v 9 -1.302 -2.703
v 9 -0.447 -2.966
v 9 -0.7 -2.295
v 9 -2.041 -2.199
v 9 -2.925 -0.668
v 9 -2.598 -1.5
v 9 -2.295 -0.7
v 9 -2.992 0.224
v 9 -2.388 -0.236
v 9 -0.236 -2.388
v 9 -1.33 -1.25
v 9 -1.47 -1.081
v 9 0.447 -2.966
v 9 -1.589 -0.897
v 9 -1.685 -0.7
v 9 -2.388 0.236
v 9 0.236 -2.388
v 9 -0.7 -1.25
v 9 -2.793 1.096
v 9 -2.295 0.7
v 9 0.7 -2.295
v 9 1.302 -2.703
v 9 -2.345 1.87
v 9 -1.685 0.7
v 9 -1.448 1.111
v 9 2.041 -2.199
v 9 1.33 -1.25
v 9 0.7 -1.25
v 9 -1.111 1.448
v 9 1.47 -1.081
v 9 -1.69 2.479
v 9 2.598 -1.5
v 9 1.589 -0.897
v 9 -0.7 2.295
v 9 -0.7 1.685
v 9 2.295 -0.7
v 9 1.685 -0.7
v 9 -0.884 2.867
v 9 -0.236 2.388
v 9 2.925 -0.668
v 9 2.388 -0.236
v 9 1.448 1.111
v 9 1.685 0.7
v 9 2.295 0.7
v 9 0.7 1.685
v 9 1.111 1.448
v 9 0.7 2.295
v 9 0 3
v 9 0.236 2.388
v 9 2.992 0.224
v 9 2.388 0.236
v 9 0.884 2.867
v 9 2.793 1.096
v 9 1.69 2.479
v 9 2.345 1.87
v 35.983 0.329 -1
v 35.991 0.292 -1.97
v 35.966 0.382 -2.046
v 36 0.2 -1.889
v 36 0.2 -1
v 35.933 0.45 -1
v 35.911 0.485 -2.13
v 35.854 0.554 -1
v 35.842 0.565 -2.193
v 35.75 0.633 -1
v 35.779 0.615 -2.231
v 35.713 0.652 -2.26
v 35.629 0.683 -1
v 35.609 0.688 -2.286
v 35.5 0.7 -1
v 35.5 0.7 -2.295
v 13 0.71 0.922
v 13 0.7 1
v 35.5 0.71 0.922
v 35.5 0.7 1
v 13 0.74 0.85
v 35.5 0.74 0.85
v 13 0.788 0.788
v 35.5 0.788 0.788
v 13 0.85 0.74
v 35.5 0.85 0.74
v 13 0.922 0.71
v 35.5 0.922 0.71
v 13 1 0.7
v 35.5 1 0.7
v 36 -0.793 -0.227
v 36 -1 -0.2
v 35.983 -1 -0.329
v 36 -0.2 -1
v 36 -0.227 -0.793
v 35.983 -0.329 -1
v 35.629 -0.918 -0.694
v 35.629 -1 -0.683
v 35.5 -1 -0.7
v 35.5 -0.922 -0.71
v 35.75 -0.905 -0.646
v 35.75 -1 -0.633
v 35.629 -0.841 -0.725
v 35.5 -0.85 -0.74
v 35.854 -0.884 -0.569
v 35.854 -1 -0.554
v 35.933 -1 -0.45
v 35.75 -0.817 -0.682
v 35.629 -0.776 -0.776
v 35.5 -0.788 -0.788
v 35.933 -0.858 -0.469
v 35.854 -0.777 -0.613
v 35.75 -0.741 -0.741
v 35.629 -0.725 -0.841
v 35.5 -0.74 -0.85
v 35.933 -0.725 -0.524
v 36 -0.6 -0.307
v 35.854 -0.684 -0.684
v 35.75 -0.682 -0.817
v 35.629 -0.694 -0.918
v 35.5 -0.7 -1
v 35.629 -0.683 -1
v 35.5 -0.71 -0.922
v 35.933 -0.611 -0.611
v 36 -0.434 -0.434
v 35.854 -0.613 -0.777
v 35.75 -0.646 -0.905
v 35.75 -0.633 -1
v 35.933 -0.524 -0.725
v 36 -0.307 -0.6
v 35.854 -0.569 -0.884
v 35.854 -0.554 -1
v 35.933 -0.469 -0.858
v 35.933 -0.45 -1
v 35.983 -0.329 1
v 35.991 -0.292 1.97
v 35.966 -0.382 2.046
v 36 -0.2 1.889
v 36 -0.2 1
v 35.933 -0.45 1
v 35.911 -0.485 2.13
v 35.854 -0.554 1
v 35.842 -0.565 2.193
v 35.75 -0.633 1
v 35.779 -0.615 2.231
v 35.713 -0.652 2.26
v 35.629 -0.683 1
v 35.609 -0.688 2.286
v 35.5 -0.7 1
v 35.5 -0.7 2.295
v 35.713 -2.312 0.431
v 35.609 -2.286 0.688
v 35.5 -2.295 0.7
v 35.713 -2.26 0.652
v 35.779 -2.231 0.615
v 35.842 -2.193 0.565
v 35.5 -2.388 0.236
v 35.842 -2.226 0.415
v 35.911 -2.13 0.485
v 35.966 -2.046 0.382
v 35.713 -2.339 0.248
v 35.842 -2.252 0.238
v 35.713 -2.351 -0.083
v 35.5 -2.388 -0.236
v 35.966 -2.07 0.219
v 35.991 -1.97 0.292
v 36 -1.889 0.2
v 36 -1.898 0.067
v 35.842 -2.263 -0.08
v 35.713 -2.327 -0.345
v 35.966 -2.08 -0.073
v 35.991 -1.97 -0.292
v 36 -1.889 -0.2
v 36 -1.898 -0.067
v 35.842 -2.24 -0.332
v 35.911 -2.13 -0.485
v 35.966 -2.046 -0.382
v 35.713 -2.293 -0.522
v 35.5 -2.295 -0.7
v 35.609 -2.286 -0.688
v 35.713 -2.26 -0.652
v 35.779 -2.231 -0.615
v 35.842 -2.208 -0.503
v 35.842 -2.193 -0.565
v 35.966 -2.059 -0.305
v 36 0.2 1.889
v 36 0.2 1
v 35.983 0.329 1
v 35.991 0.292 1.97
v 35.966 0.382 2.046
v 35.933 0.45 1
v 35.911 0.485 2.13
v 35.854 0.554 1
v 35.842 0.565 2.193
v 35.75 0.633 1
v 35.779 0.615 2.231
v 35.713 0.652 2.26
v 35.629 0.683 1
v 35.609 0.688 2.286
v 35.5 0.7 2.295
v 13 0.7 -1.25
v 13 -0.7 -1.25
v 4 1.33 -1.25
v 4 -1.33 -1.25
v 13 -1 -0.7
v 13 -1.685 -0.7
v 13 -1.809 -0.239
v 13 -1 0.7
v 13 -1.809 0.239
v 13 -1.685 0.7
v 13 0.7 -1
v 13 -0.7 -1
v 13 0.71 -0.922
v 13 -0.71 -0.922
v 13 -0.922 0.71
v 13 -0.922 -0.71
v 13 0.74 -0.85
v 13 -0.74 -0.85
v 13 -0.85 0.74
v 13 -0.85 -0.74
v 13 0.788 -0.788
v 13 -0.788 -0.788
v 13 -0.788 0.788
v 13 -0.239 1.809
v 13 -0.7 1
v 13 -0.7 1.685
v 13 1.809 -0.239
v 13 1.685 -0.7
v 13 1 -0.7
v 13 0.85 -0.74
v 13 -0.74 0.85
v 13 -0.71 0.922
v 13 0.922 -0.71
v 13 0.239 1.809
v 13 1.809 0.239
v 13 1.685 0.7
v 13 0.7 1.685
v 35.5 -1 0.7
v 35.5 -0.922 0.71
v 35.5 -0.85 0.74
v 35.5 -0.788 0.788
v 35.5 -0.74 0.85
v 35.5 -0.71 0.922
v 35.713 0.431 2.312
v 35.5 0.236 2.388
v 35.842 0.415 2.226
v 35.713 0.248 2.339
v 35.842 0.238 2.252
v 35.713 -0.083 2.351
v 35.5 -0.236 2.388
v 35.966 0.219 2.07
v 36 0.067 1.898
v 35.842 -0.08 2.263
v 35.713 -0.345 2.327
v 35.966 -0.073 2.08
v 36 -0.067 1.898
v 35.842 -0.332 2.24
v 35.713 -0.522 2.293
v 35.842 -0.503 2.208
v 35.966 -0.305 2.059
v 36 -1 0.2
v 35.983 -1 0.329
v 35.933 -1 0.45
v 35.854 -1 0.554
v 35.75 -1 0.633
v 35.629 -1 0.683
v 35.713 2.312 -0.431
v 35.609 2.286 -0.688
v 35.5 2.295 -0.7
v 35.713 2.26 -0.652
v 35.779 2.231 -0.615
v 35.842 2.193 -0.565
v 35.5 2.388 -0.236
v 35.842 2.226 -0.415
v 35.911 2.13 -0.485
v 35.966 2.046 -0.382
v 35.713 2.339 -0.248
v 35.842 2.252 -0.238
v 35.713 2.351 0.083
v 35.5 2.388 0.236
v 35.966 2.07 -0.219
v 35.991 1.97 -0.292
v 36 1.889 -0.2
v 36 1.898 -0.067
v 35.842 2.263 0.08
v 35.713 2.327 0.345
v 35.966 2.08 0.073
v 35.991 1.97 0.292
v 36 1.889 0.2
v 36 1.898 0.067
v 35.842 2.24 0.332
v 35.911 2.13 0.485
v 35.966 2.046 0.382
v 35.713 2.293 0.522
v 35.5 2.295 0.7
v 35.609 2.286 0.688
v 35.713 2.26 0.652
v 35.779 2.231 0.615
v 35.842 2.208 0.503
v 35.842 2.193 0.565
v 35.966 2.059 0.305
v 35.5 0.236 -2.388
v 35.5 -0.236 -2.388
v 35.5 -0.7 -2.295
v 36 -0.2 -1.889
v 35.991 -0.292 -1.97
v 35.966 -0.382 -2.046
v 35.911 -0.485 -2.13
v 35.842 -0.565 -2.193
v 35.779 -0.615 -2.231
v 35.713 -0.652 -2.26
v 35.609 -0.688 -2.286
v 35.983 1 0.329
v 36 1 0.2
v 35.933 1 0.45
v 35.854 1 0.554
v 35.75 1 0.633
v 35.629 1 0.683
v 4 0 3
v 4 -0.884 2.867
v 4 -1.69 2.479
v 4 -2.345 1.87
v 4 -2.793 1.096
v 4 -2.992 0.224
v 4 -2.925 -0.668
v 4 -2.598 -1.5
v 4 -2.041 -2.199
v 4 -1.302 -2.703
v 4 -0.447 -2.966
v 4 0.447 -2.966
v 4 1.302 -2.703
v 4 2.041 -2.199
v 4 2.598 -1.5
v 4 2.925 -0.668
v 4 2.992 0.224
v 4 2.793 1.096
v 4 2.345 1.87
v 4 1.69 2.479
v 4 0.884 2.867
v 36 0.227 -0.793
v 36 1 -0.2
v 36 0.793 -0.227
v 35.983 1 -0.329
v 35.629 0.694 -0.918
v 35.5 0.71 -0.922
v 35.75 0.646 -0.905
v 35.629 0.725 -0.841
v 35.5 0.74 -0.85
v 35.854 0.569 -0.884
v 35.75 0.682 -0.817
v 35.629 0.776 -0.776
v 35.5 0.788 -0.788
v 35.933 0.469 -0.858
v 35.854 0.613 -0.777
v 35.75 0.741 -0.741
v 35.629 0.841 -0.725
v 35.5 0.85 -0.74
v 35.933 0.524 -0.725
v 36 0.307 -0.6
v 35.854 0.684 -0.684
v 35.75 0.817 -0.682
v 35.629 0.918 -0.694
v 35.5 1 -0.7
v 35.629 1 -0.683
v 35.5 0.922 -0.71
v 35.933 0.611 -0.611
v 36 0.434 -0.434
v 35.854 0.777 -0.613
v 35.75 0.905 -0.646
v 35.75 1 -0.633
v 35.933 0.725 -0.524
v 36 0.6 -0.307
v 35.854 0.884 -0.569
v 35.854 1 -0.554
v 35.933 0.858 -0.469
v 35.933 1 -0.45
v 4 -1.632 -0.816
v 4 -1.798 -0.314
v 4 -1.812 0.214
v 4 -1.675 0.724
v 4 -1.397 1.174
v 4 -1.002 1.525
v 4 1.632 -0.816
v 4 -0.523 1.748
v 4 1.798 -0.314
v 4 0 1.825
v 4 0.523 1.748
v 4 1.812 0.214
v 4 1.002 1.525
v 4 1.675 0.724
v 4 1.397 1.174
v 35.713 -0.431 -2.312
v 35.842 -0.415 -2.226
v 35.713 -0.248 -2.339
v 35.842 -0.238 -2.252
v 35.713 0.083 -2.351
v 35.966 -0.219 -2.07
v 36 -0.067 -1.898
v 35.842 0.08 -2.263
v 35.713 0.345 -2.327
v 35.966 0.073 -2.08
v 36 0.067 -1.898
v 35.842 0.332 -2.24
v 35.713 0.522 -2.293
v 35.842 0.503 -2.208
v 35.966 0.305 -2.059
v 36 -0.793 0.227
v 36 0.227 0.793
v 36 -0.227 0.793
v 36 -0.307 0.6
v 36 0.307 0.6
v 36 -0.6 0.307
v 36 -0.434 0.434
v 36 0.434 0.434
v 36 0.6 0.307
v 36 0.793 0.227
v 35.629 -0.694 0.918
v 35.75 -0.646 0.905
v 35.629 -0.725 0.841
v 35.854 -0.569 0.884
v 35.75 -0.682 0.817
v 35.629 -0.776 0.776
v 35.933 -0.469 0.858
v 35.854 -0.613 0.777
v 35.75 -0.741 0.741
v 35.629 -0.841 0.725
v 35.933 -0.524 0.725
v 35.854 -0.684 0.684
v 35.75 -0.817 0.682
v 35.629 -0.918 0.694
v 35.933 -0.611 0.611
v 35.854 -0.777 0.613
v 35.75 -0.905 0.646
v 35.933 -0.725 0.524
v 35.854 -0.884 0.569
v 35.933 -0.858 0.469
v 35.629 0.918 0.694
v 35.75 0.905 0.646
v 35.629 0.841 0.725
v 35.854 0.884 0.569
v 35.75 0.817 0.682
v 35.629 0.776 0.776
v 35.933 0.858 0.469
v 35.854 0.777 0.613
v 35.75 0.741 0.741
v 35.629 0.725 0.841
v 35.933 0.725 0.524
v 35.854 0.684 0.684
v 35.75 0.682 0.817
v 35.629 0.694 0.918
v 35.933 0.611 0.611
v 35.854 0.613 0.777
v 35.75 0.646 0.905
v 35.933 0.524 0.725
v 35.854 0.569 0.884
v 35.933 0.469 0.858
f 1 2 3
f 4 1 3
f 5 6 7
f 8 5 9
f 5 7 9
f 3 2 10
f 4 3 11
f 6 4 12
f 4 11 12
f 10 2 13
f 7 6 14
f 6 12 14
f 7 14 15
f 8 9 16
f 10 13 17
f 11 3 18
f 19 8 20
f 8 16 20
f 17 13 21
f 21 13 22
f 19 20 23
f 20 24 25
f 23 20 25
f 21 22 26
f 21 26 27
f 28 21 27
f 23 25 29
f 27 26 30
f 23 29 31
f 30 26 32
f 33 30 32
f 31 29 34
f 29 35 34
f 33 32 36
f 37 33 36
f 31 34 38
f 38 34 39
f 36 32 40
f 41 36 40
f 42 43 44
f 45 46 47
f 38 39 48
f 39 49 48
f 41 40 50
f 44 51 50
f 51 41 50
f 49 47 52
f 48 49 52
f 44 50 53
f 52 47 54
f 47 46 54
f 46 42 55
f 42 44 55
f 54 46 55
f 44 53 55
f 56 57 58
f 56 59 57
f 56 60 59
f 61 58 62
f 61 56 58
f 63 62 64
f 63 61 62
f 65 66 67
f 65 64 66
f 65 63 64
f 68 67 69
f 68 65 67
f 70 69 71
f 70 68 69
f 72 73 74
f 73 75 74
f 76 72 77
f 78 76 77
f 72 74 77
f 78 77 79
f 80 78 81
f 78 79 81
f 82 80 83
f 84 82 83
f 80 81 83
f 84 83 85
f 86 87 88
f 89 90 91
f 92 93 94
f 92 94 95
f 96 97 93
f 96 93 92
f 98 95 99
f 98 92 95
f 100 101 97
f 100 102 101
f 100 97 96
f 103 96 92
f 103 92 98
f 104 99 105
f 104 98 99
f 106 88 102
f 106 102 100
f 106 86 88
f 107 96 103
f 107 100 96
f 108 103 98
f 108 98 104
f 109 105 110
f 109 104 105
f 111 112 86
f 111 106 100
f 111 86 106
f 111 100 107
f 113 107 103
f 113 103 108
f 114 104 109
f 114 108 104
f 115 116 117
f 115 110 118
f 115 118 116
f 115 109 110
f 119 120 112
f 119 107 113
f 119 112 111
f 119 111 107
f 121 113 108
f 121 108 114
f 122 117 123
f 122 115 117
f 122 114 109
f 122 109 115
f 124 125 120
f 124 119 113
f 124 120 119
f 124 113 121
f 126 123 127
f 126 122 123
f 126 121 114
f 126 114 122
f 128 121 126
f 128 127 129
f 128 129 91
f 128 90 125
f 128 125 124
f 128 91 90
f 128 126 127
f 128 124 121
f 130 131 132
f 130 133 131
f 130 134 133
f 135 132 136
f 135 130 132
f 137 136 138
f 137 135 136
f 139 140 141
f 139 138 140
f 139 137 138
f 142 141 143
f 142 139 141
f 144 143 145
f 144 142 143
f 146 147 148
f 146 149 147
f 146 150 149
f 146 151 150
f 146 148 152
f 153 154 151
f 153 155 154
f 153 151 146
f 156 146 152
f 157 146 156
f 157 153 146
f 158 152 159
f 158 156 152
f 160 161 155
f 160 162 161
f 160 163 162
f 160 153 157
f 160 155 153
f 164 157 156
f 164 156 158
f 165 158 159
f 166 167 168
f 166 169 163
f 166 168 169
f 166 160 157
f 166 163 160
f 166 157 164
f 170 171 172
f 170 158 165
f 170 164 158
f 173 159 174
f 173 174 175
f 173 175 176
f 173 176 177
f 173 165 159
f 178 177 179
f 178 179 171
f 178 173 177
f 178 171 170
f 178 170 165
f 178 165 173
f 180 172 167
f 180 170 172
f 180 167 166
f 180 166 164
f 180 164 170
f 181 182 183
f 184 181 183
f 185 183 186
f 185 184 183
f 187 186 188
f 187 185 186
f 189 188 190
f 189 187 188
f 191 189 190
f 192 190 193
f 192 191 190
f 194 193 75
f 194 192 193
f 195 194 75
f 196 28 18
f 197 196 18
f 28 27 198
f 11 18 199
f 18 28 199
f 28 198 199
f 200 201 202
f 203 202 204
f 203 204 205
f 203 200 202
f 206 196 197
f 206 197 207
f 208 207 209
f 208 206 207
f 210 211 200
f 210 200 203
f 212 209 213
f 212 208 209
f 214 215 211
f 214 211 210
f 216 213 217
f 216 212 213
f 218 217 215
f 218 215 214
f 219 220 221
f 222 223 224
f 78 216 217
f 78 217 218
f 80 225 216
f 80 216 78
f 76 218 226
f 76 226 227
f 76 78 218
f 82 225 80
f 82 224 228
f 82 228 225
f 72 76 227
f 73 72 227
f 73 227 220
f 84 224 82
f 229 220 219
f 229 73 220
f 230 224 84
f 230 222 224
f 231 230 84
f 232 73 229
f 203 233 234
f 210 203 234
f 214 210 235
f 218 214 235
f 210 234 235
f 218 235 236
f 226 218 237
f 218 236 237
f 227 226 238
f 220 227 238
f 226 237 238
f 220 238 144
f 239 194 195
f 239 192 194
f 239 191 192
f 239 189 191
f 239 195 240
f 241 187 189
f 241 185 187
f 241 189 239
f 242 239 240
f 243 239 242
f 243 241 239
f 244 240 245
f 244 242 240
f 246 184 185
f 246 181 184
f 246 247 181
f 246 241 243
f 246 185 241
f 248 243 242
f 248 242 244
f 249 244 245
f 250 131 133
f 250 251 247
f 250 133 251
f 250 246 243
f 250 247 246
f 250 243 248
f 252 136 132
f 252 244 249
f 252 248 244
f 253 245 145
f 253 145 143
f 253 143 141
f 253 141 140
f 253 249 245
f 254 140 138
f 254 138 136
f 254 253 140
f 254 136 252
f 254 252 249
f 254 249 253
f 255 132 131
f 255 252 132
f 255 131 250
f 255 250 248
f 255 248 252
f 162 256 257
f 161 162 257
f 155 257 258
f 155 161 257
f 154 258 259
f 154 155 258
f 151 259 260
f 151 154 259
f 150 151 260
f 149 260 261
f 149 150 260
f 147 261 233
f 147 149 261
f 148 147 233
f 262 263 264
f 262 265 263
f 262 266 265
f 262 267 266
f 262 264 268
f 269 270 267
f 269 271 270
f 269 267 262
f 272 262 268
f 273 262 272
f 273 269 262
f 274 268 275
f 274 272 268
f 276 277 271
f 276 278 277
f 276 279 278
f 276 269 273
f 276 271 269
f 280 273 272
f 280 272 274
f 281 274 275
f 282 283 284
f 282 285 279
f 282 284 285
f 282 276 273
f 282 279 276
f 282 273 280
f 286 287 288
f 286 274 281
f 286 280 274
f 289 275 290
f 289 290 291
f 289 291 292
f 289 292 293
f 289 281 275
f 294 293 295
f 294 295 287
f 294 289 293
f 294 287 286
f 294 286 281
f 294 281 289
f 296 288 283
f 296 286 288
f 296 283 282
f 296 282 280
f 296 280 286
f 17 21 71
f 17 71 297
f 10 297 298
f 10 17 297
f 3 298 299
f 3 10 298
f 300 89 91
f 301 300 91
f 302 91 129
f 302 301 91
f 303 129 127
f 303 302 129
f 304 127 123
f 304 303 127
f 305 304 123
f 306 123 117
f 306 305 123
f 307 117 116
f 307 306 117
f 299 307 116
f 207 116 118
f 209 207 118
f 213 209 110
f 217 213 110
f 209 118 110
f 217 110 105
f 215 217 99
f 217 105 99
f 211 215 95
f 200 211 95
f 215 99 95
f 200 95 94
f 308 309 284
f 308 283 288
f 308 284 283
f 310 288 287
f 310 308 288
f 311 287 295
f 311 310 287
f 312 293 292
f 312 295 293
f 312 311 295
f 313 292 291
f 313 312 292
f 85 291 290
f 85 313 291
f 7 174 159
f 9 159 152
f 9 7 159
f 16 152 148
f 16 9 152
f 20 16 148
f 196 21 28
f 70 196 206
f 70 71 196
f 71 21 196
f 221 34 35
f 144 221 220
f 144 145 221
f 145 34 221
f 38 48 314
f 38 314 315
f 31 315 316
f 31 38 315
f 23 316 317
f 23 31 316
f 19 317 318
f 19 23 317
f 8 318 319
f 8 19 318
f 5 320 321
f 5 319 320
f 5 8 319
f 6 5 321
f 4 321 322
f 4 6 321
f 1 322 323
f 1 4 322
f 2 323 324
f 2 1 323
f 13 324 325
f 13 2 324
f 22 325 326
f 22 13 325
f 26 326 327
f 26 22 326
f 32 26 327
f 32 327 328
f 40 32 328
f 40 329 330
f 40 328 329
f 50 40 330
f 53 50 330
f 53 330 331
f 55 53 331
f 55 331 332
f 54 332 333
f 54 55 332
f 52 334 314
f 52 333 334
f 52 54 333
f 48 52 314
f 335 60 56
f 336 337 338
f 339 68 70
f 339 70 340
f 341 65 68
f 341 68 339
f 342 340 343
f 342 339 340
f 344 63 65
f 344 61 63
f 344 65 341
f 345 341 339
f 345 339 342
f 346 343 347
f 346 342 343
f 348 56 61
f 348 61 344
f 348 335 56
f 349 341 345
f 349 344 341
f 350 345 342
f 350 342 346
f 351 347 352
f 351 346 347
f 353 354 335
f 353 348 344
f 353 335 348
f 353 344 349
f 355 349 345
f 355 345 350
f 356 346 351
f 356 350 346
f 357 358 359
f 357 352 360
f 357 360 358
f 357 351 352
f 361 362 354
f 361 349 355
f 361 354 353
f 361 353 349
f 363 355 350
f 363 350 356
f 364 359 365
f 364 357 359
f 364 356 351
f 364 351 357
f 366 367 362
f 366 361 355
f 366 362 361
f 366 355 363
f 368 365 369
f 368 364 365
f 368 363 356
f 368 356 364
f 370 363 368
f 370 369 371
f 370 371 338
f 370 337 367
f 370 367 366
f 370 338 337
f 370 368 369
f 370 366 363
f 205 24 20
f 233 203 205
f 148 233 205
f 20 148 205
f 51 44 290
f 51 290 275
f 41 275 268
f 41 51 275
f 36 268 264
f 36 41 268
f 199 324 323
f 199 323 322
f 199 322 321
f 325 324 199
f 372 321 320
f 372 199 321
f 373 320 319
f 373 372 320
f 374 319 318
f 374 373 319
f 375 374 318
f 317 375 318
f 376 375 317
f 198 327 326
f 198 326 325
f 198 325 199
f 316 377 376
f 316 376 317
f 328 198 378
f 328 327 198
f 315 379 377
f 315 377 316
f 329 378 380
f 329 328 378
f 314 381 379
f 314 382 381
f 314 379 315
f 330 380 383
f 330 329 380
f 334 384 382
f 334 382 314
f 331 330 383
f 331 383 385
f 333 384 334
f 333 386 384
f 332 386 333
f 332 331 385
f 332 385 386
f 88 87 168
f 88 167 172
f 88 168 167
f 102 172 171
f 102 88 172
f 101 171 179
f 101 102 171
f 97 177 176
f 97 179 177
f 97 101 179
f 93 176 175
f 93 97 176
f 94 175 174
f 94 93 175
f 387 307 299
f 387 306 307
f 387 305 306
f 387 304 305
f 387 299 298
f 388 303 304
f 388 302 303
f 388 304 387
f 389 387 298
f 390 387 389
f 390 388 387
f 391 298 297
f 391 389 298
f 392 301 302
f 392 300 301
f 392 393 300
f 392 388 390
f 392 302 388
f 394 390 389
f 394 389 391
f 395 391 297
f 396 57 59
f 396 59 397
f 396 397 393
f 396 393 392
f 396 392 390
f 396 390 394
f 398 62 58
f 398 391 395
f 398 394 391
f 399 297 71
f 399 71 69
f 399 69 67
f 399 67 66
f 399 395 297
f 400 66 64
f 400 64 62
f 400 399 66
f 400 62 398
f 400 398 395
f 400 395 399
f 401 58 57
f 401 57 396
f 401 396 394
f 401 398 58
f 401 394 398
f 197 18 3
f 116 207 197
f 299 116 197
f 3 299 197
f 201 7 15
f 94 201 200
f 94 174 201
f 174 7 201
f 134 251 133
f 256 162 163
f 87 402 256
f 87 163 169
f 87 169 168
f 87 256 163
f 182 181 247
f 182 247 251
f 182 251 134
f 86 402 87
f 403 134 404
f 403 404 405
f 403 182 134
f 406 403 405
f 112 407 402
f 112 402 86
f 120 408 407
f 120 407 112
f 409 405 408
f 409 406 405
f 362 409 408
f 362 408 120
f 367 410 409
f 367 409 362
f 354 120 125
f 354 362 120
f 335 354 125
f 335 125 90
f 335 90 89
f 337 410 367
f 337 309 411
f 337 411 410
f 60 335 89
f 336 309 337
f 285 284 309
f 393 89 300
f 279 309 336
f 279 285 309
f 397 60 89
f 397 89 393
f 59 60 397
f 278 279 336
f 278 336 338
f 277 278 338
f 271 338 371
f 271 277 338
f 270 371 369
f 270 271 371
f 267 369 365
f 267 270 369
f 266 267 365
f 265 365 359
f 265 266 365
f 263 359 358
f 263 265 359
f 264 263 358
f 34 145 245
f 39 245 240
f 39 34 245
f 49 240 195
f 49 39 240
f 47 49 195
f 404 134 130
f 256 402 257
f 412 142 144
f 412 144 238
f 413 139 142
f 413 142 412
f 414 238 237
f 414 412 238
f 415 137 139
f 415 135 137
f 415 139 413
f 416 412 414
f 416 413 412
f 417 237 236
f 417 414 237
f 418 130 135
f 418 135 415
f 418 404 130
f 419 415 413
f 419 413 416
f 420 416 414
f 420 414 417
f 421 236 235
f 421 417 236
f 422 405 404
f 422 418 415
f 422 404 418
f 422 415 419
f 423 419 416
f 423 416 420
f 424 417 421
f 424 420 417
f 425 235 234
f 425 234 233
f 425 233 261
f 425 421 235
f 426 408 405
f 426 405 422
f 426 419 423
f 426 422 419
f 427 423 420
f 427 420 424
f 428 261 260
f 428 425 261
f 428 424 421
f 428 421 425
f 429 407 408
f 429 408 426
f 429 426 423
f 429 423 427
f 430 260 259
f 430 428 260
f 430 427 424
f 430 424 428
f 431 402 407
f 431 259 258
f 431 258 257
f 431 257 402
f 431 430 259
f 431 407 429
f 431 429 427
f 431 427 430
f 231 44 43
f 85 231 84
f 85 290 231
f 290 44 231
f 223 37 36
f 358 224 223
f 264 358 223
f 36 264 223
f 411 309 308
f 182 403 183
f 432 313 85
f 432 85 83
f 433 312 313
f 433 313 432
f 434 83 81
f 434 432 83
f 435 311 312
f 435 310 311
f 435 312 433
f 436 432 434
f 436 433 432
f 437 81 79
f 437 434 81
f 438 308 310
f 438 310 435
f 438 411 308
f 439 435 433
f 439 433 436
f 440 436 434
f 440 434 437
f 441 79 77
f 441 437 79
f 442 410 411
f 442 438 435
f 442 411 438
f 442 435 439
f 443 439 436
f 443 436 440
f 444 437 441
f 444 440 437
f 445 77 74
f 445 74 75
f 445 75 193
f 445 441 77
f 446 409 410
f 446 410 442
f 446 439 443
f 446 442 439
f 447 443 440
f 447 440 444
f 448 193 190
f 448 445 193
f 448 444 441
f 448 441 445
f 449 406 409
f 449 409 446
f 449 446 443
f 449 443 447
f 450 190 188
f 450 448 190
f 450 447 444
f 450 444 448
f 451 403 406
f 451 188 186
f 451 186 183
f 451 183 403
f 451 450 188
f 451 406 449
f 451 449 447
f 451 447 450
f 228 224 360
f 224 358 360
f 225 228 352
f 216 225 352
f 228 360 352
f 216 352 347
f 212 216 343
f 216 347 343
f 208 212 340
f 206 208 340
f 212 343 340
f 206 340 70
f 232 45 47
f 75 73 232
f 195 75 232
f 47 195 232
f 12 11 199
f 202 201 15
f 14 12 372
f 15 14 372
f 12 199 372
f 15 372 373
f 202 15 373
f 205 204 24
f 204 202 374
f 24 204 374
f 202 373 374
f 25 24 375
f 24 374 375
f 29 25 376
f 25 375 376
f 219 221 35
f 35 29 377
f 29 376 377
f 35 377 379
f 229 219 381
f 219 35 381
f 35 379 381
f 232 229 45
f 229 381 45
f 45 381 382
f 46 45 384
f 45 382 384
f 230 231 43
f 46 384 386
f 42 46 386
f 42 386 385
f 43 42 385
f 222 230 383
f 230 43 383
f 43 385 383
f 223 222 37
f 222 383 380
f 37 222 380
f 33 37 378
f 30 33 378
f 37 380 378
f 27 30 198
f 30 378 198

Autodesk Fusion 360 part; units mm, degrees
sketch "Sketch1" plane through (0, 0, 0) normal (1, 0, 0) x (0, 0, -1)
  circle A0 centre (0, 0) radius 2.3995
  dimension "d1" = 4.799
extrude "Extrude1" add sketch "Sketch1" along normal blind 36
sketch "Sketch2" plane through (36, 0, 0) normal (1, 0, 0) x (0, 0, -1)
  circle A0 centre (0, 0) radius 2.3995
  line L0 (0.7, 2.3995) -> (-0.7, 2.3995)
  line L1 (-0.7, -2.3995) -> (0.7, -2.3995)
  line L2 (0.7, 2.3995) -> (-0.7, -2.3995) construction
  line L3 (-0.7, 2.3995) -> (0.7, -2.3995) construction
  line L4 (-2.3995, 0.7) -> (-2.3995, -0.7)
  line L5 (2.3995, -0.7) -> (2.3995, 0.7)
  line L6 (2.3995, 0.7) -> (-2.3995, -0.7) construction
  line L7 (-2.3995, 0.7) -> (2.3995, -0.7) construction
  line L8 (-0.7, 2.3995) -> (-0.7, 1)
  line L9 (-0.7, -1) -> (-0.7, -2.3995)
  line L10 (-2.3995, -0.7) -> (-1, -0.7)
  line L11 (1, -0.7) -> (2.3995, -0.7)
  line L12 (0.7, -2.3995) -> (0.7, -1)
  line L13 (0.7, 1) -> (0.7, 2.3995)
  line L14 (2.3995, 0.7) -> (1, 0.7)
  line L15 (-1, 0.7) -> (-2.3995, 0.7)
  arc A1 (-1, 0.7) -> (-0.7, 1) centre (-1, 1) ccw
  arc A2 (0.7, 1) -> (1, 0.7) centre (1, 1) ccw
  arc A3 (1, -0.7) -> (0.7, -1) centre (1, -1) ccw
  arc A4 (-0.7, -1) -> (-1, -0.7) centre (-1, -1) ccw
  dimension "d4" = 4.799
  dimension "d5" = 1.4
  dimension "d6" = 4.799
  dimension "d7" = 1.4
  dimension "d8" = 0.3
  dimension "d11" = 0.3
extrude "Extrude2" cut sketch "Sketch2" against normal blind 27 contours A0 L13 L14 A2 | A0 L11 L12 A3 | A0 L8 L15 A1 | A0 L9 L10 A4
sketch "Sketch4" plane through (0, 0, 0) normal (-1, 0, 0) x (0, 0, 1)
  circle A0 centre (0, 0) radius 2.3995
  circle A1 centre (0, 0) radius 2.3995
  arc A2 (2.2951, 0.7) -> (0.7, 2.2951) centre (0, 0) ccw
extrude "Extrude4" cut sketch "Sketch4" against normal blind 9
sketch "Sketch5" plane through (9, 0, 0) normal (-1, 0, 0) x (0, 0, 1)
  line L0 (-2.2951, -0.7) -> (-1, -0.7)
  arc A0 (-0.7, -1) -> (-1, -0.7) centre (-1, -1) ccw
  line L1 (-0.7, -1) -> (-0.7, -2.2951)
  arc A1 (-0.7, -2.2951) -> (0.7, -2.2951) centre (0, 0) ccw
  line L2 (0.7, -2.2951) -> (0.7, -1)
  arc A2 (1, -0.7) -> (0.7, -1) centre (1, -1) ccw
  line L3 (1, -0.7) -> (2.2951, -0.7)
  arc A3 (2.2951, -0.7) -> (2.2951, 0.7) centre (0, 0) ccw
  line L4 (2.2951, 0.7) -> (1, 0.7)
  arc A4 (0.7, 1) -> (1, 0.7) centre (1, 1) ccw
  line L5 (0.7, 1) -> (0.7, 2.2951)
  arc A5 (0.7, 2.2951) -> (-0.7, 2.2951) centre (0, 0) ccw
  line L6 (-0.7, 2.2951) -> (-0.7, 1)
  arc A6 (-1, 0.7) -> (-0.7, 1) centre (-1, 1) ccw
  line L7 (-1, 0.7) -> (-2.2951, 0.7)
  arc A7 (-2.2951, 0.7) -> (-2.2951, -0.7) centre (0, 0) ccw
  circle A8 centre (0, 0) radius 3
  dimension "d19" = 6
extrude "Extrude5" add sketch "Sketch5" along normal blind 5 contours L0 A0 L1 A1 L2 A2 L3 A3 L4 A4 L5 A5 L6 A6 L7 A7 | A8
sketch "Sketch6" plane through (4, 0, 0) normal (-1, 0, 0) x (0, 0, 1)
  circle A0 centre (0, 0) radius 3
  line L0 (-1.25, 0) -> (-1.25, 1.3297)
  line L1 (-2.2951, 0.7) -> (-1, 0.7)
  line L2 (-1.25, 1.3297) -> (-1.25, -1.3297)
  arc A1 (-1.25, -1.3297) -> (-1.25, 1.3297) centre (0, 0) ccw
  point P0 (-0.7, -2.2951)
  dimension "d22" = 3.65
  dimension "d23" = 1.25
extrude "Extrude6" cut sketch "Sketch6" against normal blind 9 contours L0 L2 A1
fillet "Fillet3" radius 0.5 16 edges at (36, 2.3995, 0) (36, 0.7, -1.6476) (36, 0.7879, -0.7879) (36, 1.6476, -0.7) (36, 1.6476, 0.7) (36, 0.7879, 0.7879) (36, 0.7, 1.6476) (36, 0, 2.3995) (36, -0.7, 1.6476) (36, -0.7879, 0.7879) (36, -1.6476, 0.7) (36, -2.3995, 0) (36, -1.6476, -0.7) (36, -0.7879, -0.7879) (36, -0.7, -1.6476) (36, 0, -2.3995)
